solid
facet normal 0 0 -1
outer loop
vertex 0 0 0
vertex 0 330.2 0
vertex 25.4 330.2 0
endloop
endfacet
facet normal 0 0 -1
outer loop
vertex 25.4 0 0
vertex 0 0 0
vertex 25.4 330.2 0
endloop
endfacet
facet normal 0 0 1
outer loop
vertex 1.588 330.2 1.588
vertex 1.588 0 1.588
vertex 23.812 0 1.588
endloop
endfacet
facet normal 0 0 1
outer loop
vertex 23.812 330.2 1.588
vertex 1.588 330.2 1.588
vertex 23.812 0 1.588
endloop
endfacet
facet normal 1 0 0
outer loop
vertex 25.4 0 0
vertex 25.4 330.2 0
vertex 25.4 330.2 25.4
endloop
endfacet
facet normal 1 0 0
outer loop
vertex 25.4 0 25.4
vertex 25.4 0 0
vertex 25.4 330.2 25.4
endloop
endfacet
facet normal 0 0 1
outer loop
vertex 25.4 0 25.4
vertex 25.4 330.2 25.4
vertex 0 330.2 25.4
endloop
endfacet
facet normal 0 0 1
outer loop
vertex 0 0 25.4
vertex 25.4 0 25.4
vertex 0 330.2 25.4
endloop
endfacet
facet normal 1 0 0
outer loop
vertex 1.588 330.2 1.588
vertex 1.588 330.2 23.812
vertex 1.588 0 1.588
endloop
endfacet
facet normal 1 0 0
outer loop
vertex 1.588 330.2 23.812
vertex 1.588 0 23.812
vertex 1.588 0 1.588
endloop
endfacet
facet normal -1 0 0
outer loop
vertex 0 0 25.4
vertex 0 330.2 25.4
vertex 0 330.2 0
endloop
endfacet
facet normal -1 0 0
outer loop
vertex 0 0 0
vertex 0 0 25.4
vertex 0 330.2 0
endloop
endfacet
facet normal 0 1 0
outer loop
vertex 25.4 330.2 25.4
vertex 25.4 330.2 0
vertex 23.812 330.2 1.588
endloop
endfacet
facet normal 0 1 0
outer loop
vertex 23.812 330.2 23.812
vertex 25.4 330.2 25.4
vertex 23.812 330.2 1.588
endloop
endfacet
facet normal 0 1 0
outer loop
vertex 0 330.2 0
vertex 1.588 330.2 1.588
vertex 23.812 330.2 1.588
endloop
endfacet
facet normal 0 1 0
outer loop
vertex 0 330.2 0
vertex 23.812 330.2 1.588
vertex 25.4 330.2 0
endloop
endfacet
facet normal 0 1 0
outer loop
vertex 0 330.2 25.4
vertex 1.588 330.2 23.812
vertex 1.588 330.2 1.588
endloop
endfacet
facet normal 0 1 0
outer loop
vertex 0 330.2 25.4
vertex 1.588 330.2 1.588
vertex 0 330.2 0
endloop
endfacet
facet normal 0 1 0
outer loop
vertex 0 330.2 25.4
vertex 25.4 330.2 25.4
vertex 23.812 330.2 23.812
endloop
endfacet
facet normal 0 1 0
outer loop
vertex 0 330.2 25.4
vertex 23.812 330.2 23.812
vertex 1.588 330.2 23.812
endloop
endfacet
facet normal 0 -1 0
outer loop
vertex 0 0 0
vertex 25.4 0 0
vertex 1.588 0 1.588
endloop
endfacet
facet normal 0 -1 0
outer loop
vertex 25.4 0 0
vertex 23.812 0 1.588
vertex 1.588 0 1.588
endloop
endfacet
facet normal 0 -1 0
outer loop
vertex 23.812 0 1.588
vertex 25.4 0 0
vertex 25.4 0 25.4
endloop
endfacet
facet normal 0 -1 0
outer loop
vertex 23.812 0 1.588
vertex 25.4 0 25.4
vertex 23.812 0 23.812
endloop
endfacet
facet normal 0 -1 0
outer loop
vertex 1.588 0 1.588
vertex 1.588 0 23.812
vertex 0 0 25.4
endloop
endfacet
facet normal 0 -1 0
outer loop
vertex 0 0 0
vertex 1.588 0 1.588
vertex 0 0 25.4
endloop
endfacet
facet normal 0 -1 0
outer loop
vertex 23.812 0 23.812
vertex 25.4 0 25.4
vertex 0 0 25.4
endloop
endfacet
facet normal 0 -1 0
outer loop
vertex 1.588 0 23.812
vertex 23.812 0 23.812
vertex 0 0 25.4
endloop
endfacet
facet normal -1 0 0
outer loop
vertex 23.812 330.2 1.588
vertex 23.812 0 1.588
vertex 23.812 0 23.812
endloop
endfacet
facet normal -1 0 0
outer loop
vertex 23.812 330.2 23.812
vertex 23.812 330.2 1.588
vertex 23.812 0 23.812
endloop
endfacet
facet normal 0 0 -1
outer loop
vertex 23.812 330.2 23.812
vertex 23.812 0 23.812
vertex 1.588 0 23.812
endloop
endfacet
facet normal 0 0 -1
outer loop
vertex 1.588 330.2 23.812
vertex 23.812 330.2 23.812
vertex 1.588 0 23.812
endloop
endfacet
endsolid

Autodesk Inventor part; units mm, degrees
ref_plane "YZ Plane" through (0, 0, 0) normal (1, 0, 0) x (0, 1, 0)
ref_plane "XZ Plane" through (0, 0, 0) normal (0, 1, 0) x (-1, 0, 0)
ref_plane "Work Plane1" through (0, 0, 0) normal (0, 1, 0) x (-1, 0, 0)
sketch "Sketch1" plane through (0, 0, 0) normal (0, 1, 0) x (-1, 0, 0)
  line L0 (0, 0) -> (-25.4, 0)
  line L1 (-25.4, 0) -> (-25.4, 25.4)
  line L2 (-25.4, 25.4) -> (0, 25.4)
  line L3 (0, 25.4) -> (0, 0)
  line L4 (-23.8125, 23.8125) -> (-1.5875, 23.8125)
  line L5 (-1.5875, 23.8125) -> (-1.5875, 1.5875)
  line L6 (-1.5875, 1.5875) -> (-23.8125, 1.5875)
  line L7 (-23.8125, 1.5875) -> (-23.8125, 23.8125)
  point P0 (-12.7, 0)
  point P1 (-12.7, 1.5875)
  dimension "d0" = 25.4
  dimension "d1" = 25.4
  dimension "d2" = 1.5875
  dimension "d3" = 1.5875
  dimension "d4" = 1.5875
  dimension "d5" = 1.5875
extrude "Extrusion1" add sketch "Sketch1" along normal blind 330.2
properties part number "54.92Shaft"
